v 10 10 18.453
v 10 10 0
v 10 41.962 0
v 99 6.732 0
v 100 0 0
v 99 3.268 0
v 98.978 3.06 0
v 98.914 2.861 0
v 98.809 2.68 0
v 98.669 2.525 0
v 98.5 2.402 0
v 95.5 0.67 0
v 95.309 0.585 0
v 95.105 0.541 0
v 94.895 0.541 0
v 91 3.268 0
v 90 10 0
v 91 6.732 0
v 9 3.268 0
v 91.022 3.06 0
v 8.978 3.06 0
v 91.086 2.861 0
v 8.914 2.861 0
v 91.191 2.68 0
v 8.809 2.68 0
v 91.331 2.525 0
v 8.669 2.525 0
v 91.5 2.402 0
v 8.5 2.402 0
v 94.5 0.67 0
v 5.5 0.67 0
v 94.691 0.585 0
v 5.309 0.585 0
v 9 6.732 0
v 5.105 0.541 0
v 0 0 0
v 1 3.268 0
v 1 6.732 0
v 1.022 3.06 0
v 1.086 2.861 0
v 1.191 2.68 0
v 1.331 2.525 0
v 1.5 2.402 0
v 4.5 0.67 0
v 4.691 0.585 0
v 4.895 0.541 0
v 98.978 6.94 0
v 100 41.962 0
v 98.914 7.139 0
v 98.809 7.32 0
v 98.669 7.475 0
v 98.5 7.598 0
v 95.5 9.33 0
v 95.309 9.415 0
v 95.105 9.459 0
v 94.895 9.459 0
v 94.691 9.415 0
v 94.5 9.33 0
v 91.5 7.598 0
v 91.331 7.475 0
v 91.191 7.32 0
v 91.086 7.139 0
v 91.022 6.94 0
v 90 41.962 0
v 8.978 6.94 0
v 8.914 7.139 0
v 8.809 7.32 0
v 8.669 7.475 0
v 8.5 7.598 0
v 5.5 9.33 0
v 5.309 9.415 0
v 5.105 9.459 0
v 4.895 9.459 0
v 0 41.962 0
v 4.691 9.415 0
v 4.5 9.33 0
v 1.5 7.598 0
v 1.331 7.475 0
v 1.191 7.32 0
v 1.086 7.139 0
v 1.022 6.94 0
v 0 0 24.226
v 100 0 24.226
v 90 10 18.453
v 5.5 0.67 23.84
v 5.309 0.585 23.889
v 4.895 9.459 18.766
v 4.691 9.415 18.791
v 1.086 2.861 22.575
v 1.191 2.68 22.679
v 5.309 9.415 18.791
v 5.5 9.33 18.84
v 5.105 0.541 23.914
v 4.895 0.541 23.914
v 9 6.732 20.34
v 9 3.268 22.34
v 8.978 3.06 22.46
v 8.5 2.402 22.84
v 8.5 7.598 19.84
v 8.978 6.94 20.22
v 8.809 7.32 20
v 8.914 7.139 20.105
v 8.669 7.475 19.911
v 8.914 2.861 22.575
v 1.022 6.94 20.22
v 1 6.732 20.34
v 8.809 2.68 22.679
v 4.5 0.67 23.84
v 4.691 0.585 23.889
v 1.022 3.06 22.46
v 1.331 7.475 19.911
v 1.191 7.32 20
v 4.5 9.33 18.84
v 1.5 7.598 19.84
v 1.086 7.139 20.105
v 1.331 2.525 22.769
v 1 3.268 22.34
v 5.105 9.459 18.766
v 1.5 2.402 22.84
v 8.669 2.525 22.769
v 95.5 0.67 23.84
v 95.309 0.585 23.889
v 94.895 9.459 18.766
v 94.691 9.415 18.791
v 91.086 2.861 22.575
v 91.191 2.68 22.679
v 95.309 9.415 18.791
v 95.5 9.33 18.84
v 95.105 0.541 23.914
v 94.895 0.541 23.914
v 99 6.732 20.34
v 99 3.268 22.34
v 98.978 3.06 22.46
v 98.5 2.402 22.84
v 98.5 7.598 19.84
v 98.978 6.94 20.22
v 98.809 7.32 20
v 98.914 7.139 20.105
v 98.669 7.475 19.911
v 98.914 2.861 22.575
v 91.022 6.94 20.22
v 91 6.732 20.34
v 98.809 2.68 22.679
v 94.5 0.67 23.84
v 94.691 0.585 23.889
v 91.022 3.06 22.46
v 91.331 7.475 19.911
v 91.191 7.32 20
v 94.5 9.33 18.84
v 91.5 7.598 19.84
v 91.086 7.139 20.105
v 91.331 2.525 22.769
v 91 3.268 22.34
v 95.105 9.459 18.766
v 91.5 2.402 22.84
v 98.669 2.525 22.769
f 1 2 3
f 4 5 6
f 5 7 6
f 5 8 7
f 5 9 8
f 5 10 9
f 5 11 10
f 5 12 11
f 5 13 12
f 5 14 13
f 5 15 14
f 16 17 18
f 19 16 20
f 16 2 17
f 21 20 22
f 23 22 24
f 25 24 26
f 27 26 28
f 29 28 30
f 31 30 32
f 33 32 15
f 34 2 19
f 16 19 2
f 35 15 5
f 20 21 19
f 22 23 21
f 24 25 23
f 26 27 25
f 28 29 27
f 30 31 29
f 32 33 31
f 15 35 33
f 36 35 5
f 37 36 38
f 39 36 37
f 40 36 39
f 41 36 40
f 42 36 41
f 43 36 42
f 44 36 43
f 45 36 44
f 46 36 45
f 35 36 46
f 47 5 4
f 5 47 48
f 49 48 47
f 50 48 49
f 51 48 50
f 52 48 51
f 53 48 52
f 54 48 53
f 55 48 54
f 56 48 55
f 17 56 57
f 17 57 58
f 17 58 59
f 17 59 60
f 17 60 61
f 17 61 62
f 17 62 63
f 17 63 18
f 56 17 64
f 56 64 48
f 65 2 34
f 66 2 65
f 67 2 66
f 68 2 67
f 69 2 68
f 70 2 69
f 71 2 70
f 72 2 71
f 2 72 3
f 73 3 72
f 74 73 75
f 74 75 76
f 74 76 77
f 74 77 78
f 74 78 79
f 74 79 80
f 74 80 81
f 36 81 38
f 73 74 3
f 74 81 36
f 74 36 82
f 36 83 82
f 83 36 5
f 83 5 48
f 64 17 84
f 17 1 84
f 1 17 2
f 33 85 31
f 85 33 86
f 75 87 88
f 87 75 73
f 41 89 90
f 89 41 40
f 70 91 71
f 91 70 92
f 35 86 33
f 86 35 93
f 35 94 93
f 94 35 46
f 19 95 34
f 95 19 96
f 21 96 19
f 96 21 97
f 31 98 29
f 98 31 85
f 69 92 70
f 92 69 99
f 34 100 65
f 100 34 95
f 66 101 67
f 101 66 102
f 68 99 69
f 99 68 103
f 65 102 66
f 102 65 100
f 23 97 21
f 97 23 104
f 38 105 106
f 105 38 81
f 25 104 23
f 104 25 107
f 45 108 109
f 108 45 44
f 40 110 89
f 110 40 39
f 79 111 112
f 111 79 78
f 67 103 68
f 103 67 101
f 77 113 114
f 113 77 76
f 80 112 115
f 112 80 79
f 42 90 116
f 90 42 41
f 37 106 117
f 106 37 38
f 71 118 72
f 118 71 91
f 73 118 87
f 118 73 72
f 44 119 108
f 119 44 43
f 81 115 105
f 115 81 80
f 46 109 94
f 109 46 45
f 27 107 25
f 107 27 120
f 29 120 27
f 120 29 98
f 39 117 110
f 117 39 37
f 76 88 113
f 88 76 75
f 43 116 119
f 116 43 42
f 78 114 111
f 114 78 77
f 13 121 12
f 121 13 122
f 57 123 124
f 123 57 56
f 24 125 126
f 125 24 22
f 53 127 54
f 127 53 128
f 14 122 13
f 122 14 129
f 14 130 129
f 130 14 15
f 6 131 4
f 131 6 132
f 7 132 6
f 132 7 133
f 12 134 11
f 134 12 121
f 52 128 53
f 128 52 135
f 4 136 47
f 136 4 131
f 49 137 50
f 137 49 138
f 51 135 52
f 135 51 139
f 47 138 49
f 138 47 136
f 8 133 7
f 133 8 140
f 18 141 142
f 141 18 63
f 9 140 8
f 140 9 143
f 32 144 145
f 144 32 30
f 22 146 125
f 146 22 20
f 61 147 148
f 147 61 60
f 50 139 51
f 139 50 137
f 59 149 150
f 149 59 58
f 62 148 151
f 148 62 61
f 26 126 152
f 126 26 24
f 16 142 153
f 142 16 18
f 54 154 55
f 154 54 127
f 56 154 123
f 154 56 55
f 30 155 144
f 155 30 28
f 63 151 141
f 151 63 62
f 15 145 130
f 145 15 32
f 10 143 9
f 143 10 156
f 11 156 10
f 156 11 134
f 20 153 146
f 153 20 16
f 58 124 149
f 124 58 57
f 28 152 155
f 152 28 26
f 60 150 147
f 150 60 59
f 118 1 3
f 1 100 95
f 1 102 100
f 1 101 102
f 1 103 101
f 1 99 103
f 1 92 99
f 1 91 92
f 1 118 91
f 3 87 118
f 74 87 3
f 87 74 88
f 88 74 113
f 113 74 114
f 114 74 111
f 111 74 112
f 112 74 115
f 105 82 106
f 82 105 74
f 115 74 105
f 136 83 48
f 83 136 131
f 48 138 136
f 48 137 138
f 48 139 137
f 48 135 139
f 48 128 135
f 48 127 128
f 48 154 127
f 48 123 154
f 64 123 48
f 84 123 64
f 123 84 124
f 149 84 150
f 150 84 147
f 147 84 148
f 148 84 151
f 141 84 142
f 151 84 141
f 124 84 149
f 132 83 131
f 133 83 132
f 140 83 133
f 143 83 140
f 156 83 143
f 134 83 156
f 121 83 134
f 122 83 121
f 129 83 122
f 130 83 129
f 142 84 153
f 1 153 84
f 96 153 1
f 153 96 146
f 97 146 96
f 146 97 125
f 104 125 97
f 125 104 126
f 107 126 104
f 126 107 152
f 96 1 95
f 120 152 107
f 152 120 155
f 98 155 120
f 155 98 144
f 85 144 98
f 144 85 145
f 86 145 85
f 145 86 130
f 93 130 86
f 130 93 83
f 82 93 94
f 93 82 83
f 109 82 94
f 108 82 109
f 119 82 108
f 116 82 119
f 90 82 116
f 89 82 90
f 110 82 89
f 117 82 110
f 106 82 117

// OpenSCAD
module spacer_stand_hole(outer_diameter, spacer_height) {
    // TODO: explain.
    outer_radius = outer_diameter / 2;
    triangle_side = 2 * outer_radius / sqrt(3);
    linear_extrude(spacer_height) minkowski() {
        polygon(
            points=[
                [-outer_radius, -triangle_side / 2],
                [-outer_radius, triangle_side / 2],
                [0, triangle_side],
                [outer_radius, triangle_side / 2],
                [outer_radius, -triangle_side / 2],
                [0, -triangle_side]
            ],
            paths=[ [0, 1, 2, 3, 4, 5] ]
        );
        circle(1, $fn=30);
    }
}


module stand_bar(length, thickness, max_height) {
    cube([thickness, length, max_height]);
}


module connector_bar(width, thickness, max_height) {
    cube([width, thickness, max_height]);
}


module keyboard_stand(length, width, thickness, angle) {
    max_height = 30;
    spacer_diameter = 6;
    difference() {
        difference() {
            union() {
                stand_bar(length, thickness, max_height);
                translate([width - thickness, 0, 0]) stand_bar(length, thickness, max_height);
                connector_bar(width, thickness, max_height);
            }
            translate([thickness / 2, thickness / 2, -max_height]) spacer_stand_hole(spacer_diameter, 3 * max_height);
            translate([width - thickness / 2, thickness / 2, -max_height]) spacer_stand_hole(spacer_diameter, 3 * max_height);
        }
        translate([-10, -10, max_height]) rotate(-angle, [1, 0, 0]) cube([width + 20, length + 20, 100]);
    }
}


keyboard_stand(50, 100, 10, 30);
